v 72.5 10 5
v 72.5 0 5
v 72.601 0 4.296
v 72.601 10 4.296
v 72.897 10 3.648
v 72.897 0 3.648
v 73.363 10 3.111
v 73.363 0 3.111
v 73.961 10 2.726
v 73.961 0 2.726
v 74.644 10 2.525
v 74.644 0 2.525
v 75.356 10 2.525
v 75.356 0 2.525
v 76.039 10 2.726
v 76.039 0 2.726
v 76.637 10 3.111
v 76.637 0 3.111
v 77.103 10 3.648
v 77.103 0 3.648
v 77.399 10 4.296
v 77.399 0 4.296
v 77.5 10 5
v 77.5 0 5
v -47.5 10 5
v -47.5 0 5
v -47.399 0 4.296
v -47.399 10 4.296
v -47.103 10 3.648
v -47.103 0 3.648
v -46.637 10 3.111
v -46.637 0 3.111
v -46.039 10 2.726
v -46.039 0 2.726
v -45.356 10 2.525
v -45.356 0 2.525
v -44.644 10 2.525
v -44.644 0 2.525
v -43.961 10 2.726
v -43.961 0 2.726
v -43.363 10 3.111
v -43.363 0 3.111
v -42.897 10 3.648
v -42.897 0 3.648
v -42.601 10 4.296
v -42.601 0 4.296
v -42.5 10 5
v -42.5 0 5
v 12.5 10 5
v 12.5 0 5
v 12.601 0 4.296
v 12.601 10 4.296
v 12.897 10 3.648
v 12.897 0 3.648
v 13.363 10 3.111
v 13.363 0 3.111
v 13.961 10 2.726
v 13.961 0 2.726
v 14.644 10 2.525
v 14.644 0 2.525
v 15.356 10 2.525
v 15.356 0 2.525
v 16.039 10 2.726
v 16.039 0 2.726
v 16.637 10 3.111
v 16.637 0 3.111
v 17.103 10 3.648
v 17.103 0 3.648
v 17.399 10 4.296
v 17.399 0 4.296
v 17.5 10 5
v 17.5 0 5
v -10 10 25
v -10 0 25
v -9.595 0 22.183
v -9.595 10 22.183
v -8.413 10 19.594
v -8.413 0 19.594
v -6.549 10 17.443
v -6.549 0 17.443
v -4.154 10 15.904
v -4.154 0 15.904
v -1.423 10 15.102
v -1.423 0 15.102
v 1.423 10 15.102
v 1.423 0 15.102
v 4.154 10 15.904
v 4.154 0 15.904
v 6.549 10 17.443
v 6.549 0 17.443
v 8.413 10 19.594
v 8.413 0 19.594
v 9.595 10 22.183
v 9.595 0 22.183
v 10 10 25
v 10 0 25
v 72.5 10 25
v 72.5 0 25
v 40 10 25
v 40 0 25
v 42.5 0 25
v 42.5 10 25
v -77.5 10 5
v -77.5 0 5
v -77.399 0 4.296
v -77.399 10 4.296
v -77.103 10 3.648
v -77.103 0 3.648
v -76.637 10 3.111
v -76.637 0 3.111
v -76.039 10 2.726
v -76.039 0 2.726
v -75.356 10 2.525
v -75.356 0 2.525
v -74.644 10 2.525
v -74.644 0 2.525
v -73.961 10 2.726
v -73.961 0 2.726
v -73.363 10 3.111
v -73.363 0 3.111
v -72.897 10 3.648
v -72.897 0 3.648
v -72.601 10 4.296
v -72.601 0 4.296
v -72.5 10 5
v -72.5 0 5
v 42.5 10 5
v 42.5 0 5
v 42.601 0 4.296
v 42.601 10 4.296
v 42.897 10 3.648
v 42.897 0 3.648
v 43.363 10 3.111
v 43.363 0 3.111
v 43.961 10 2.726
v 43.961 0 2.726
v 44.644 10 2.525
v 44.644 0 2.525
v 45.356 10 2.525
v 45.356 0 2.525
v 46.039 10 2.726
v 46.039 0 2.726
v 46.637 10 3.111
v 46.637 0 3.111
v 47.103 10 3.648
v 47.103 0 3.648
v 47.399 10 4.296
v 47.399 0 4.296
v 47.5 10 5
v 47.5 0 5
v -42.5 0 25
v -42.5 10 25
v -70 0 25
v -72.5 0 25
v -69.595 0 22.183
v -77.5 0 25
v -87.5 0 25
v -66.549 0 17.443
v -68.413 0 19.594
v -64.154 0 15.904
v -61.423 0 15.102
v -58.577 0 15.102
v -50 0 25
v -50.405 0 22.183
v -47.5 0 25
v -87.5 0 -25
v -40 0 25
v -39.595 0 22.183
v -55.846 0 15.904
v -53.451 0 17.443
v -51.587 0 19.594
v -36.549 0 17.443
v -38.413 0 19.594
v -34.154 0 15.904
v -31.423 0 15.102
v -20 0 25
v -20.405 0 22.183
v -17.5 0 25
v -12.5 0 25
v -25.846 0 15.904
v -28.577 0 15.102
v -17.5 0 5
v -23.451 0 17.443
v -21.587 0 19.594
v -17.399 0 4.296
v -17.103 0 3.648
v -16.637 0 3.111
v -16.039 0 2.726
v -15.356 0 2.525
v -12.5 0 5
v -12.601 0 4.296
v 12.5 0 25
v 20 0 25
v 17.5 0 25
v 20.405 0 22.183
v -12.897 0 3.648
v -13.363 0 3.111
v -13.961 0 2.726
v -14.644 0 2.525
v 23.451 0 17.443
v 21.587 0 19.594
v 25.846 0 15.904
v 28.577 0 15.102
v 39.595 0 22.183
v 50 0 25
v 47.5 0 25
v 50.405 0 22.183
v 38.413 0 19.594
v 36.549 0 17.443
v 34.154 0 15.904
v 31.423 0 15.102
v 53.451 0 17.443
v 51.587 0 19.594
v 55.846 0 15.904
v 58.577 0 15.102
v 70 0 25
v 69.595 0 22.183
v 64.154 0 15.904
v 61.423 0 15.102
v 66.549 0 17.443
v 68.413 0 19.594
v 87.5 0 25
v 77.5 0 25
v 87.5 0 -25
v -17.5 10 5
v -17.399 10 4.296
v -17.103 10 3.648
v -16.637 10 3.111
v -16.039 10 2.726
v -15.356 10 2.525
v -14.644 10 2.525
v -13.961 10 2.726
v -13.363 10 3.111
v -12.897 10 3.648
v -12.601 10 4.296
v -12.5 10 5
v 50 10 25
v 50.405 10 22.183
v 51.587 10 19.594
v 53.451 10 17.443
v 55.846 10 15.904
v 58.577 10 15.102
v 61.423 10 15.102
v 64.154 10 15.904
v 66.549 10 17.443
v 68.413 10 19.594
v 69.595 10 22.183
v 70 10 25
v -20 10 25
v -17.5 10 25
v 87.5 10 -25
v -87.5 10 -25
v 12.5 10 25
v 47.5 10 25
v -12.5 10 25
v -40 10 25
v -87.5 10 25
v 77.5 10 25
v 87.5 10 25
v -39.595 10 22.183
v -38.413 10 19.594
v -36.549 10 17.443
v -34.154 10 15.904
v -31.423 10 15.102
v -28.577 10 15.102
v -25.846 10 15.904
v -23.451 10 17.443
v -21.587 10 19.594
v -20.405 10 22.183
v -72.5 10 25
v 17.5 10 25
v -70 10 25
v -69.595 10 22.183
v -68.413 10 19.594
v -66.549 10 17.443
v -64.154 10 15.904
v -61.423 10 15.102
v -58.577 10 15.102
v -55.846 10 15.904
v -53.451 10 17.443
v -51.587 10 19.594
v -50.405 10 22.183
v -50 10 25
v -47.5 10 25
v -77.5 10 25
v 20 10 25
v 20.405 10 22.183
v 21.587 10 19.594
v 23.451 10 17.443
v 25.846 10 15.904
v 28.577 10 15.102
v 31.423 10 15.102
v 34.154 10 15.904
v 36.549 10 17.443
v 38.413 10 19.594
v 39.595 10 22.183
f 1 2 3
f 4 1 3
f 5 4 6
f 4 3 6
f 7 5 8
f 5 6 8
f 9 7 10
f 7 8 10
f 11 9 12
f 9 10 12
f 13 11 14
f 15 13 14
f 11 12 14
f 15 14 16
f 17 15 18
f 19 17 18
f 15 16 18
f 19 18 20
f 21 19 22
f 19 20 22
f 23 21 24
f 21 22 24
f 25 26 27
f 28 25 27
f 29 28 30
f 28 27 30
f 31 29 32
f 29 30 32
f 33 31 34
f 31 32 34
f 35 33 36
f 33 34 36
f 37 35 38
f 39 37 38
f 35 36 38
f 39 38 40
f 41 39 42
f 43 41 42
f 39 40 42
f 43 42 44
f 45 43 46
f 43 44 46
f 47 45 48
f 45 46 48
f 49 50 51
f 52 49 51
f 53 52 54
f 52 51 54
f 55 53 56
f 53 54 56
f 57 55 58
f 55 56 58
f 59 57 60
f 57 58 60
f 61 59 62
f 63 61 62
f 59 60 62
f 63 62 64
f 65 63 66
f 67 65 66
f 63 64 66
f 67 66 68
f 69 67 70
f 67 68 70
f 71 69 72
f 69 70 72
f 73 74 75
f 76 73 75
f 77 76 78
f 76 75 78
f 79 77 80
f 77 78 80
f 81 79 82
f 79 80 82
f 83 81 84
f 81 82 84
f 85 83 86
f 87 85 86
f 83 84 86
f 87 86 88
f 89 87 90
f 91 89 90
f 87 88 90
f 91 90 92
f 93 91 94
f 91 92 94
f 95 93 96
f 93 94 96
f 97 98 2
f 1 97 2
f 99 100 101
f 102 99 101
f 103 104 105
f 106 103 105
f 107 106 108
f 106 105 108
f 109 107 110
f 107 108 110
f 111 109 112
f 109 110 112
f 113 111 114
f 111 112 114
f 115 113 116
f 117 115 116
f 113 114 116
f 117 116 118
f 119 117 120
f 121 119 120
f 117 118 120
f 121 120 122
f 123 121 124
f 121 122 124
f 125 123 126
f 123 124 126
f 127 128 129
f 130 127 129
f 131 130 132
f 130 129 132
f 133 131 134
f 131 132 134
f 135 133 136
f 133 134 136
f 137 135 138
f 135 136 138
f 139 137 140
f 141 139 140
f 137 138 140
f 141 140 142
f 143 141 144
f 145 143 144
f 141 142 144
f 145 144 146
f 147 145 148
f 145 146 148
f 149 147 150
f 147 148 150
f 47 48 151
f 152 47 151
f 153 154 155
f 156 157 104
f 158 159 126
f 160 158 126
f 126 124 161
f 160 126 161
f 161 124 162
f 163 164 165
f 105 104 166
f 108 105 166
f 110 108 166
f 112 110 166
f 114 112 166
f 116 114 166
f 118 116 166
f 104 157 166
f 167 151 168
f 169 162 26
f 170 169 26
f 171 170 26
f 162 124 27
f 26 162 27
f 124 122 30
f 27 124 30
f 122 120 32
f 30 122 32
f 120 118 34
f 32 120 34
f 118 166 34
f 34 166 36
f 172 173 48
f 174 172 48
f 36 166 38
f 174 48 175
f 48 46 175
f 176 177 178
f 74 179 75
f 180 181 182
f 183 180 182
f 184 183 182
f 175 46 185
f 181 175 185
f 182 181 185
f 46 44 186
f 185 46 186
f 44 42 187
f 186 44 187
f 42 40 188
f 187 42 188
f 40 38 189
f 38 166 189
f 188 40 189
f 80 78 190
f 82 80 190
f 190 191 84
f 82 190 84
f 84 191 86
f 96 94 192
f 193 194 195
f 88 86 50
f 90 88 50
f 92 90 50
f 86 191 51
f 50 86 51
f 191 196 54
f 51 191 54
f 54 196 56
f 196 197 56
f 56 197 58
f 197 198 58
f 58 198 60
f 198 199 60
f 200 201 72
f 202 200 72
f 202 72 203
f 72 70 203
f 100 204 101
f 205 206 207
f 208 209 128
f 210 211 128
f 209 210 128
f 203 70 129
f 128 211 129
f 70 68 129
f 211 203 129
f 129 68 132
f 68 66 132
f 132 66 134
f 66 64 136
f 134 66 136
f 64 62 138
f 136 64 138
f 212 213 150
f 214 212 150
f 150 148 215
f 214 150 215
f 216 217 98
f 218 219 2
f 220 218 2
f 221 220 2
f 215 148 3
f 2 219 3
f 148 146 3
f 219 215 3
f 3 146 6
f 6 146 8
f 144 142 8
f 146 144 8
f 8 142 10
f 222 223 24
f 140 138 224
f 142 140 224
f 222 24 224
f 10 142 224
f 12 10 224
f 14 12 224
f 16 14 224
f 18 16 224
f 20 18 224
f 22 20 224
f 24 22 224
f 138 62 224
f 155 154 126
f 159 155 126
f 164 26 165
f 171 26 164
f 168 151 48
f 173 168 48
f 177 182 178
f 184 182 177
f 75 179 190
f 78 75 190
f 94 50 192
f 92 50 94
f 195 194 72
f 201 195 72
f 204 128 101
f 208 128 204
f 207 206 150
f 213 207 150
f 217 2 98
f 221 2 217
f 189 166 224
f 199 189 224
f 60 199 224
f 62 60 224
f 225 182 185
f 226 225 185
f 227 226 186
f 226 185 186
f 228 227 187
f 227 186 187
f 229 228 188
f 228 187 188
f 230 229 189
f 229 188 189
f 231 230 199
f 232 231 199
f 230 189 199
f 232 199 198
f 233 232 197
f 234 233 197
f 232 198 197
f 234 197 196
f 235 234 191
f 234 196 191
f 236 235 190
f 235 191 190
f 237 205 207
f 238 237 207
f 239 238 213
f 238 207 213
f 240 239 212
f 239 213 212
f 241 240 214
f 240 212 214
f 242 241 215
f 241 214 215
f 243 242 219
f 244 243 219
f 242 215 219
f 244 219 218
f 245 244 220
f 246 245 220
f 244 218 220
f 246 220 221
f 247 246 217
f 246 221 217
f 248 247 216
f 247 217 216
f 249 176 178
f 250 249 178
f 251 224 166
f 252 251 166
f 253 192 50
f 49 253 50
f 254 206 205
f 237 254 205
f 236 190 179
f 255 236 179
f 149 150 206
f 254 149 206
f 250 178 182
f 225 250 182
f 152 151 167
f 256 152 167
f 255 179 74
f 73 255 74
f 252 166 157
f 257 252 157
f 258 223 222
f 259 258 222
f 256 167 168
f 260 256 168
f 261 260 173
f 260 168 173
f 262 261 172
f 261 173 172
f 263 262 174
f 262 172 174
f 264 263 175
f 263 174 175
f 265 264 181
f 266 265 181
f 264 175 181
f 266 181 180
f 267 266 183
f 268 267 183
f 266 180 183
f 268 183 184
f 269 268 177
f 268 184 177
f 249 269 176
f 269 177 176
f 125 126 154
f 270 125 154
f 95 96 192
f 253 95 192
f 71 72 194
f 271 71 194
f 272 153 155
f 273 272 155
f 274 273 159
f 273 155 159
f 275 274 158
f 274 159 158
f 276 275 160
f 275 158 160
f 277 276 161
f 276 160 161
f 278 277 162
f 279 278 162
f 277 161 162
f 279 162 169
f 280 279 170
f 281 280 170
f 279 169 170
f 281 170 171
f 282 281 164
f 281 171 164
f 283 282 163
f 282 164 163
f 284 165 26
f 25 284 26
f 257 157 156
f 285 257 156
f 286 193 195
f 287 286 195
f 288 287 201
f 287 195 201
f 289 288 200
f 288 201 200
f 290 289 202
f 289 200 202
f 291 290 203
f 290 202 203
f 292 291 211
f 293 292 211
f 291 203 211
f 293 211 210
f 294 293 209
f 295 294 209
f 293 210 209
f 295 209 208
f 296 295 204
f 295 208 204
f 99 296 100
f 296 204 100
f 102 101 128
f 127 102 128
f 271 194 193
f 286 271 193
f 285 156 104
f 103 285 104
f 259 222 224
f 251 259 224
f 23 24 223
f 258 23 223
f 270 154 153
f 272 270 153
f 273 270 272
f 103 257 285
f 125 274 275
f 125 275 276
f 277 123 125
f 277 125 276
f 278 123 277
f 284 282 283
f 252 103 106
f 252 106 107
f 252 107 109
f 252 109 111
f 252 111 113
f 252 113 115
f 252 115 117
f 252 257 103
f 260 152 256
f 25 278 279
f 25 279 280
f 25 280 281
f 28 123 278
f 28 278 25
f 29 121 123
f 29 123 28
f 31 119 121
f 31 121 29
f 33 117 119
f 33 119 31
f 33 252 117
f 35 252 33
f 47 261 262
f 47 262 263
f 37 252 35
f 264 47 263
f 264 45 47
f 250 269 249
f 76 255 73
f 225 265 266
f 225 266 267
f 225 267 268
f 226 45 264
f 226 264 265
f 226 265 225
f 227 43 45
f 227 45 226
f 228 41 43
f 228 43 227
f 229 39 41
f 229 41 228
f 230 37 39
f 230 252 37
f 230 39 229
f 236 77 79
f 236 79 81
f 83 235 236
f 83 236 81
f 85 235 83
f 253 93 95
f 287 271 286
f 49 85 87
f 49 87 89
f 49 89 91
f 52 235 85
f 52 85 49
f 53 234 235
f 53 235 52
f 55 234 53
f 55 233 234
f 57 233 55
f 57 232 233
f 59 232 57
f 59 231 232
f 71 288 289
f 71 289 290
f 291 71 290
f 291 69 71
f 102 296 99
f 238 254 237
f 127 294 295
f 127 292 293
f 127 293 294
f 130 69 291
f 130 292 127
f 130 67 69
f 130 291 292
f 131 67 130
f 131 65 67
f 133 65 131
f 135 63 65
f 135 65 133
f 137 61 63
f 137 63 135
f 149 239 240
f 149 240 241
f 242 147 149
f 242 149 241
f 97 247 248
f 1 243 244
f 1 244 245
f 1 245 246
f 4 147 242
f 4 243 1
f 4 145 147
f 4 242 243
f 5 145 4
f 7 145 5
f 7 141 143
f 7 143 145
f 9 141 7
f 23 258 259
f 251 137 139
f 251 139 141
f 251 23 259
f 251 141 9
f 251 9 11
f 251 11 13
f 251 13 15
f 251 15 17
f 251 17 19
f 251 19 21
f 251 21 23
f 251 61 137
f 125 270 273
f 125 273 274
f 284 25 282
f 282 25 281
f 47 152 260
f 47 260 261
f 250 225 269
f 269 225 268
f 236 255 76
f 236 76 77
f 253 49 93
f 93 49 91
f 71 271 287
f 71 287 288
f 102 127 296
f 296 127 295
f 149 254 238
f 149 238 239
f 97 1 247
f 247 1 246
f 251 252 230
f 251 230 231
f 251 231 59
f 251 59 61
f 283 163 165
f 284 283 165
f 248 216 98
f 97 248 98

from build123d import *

# Parameters (mm, degrees)
BOSS_EXTRUDE1_DEPTH = 10


with BuildPart() as part:
    # Sketch2 → Boss-Extrude1 (new body)
    with BuildSketch(Plane(origin=(0, 0, 0), x_dir=(1, 0, 0), z_dir=(0, 1, 0))):
        with BuildLine():
            Line((-77.5, -25), (-77.5, -5))
            ThreePointArc((-77.5, -5), (-75, -2.5), (-72.5, -5))
            Line((-72.5, -5), (-72.5, -25))
            Line((-72.5, -25), (-70, -25))
            ThreePointArc((-70, -25), (-60, -15), (-50, -25))
            Line((-50, -25), (-47.5, -25))
            Line((-47.5, -25), (-47.5, -5))
            ThreePointArc((-47.5, -5), (-45, -2.5), (-42.5, -5))
            Line((-42.5, -5), (-42.5, -25))
            Line((-42.5, -25), (-40, -25))
            ThreePointArc((-40, -25), (-30, -15), (-20, -25))
            Line((-20, -25), (-17.5, -25))
            Line((-17.5, -25), (-17.5, -5))
            ThreePointArc((-17.5, -5), (-15, -2.5), (-12.5, -5))
            Line((-12.5, -5), (-12.5, -25))
            Line((-12.5, -25), (-10, -25))
            ThreePointArc((-10, -25), (0, -15), (10, -25))
            Line((10, -25), (12.5, -25))
            Line((12.5, -25), (12.5, -5))
            ThreePointArc((12.5, -5), (15, -2.5), (17.5, -5))
            Line((17.5, -5), (17.5, -25))
            Line((17.5, -25), (20, -25))
            ThreePointArc((20, -25), (30, -15), (40, -25))
            Line((40, -25), (42.5, -25))
            Line((42.5, -25), (42.5, -5))
            ThreePointArc((42.5, -5), (45, -2.5), (47.5, -5))
            Line((47.5, -5), (47.5, -25))
            Line((47.5, -25), (50, -25))
            ThreePointArc((50, -25), (60, -15), (70, -25))
            Line((70, -25), (72.5, -25))
            Line((72.5, -25), (72.5, -5))
            ThreePointArc((72.5, -5), (75, -2.5), (77.5, -5))
            Line((77.5, -5), (77.5, -25))
            Line((77.5, -25), (87.5, -25))
            Line((87.5, -25), (87.5, 25))
            Line((87.5, 25), (-87.5, 25))
            Line((-87.5, 25), (-87.5, -25))
            Line((-87.5, -25), (-77.5, -25))
        make_face()
    extrude(amount=BOSS_EXTRUDE1_DEPTH)


solid = part.part
